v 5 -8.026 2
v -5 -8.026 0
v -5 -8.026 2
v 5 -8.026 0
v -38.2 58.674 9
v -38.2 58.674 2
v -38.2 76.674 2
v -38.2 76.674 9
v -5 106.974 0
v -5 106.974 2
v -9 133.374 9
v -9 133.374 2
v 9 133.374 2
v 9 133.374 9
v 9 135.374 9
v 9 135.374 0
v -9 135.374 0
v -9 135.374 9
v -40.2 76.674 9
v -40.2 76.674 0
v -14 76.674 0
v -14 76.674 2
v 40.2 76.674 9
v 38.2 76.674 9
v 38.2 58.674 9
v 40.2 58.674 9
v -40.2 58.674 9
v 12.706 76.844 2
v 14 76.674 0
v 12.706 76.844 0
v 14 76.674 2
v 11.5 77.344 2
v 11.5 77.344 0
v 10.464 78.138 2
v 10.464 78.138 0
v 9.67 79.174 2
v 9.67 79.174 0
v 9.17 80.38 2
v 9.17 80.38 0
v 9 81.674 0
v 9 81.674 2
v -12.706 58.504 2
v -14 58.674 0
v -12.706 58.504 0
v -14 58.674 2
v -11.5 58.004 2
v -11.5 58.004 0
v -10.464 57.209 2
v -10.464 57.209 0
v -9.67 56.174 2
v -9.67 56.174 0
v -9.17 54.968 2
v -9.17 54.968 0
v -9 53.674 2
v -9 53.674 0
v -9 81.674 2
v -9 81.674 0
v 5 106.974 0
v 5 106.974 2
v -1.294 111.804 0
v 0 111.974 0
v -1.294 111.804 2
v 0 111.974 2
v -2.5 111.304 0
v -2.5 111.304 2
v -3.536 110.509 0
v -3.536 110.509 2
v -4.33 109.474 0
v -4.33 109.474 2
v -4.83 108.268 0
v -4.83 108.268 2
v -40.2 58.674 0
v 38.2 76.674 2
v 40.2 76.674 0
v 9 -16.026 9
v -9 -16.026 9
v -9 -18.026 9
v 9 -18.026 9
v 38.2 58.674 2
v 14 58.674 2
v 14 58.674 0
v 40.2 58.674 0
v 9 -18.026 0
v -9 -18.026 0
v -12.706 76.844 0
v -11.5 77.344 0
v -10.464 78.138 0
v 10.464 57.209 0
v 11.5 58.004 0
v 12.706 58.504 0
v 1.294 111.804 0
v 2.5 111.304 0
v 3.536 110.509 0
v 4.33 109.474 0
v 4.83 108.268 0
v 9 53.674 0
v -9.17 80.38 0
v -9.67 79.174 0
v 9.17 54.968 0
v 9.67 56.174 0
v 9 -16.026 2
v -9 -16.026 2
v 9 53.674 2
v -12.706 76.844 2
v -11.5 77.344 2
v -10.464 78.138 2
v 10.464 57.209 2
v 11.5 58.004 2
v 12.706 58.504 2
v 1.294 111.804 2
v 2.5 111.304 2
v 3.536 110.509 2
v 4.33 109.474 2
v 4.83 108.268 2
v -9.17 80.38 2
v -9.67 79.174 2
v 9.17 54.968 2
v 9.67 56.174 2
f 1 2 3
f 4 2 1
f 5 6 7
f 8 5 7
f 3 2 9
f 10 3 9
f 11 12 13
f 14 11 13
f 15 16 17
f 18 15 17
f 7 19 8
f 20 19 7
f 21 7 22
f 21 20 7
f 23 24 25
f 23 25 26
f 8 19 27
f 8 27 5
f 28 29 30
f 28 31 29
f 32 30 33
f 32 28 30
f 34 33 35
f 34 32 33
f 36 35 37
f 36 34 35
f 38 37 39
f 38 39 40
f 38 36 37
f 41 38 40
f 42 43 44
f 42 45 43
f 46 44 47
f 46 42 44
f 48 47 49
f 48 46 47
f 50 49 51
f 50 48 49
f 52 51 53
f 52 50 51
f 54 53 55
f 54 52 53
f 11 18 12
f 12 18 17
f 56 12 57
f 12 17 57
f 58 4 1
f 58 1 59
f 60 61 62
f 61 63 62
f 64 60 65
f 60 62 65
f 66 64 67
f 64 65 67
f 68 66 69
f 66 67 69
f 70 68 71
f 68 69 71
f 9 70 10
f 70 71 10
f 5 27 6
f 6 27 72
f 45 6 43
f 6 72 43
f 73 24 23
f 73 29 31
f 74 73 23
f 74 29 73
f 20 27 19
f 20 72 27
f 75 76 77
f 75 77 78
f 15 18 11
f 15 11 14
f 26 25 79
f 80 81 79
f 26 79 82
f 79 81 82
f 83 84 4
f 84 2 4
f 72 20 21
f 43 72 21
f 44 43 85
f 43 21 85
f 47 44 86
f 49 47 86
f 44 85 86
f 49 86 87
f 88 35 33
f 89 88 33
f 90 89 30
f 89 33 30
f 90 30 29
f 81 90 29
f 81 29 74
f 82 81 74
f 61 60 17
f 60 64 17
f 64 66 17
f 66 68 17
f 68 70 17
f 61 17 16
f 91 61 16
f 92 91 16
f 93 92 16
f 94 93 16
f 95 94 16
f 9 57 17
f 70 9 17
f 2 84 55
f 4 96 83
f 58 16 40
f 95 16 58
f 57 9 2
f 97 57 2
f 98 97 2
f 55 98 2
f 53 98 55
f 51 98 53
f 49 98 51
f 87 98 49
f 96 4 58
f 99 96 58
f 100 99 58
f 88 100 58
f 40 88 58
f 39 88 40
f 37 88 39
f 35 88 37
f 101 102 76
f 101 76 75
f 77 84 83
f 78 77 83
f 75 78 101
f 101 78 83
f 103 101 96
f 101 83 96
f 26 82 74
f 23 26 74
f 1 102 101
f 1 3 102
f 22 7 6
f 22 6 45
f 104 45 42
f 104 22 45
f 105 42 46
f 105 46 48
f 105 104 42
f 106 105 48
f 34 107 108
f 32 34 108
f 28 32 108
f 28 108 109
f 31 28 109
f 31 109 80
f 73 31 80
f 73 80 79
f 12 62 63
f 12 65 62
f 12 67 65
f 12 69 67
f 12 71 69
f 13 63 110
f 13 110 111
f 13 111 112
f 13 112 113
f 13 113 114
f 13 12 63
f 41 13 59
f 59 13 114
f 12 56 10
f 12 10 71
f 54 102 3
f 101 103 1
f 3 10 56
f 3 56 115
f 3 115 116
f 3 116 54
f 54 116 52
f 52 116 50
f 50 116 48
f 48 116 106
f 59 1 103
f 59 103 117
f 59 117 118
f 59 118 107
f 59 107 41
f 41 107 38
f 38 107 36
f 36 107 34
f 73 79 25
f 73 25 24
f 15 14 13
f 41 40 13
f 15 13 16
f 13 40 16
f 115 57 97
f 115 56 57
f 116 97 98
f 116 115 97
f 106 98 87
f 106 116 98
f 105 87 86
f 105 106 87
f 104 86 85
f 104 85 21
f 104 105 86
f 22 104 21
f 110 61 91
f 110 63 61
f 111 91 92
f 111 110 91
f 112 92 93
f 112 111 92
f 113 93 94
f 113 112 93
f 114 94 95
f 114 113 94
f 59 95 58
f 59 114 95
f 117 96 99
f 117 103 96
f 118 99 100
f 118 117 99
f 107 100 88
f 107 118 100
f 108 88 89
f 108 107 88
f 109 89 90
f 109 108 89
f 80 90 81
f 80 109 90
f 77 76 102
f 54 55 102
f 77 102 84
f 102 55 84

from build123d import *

# Parameters (mm, degrees)
F0_W     = 10
F0_H     = 120
F0_W_2   = 31.2
F0_H_2   = 18
F1_DEPTH = 2
F3_W     = 2
F3_H     = 18
F3_W_2   = 18
F3_H_2   = 2
F4_DEPTH = 7
F5_R     = 4.99999


# Not quite as in the source:
# - a fillet or chamfer is up to 0.001 mm smaller than in the source, because OpenCascade refuses the exact size


with BuildPart() as f1:
    # F0 (on Top) → F1 (new body)
    with BuildSketch(Plane.XY):
        Polygon((9, 135.3739356415), (-9, 135.3739356415), (-9, 76.6739356415), (-9, 58.6739356415), (-9, -18.0260643585), (9, -18.0260643585), (9, 58.6739356415), (9, 76.6739356415), align=None)
        with Locations((0, 51.9739356415)):
            Rectangle(F0_W, F0_H, mode=Mode.SUBTRACT)
        with Locations((-24.6, 67.6739356415)):
            Rectangle(F0_W_2, F0_H_2)
        with Locations((24.6, 67.6739356415)):
            Rectangle(F0_W_2, F0_H_2)
    extrude(amount=F1_DEPTH)

    # F3 (on face) → F4 (join)
    with BuildSketch(Plane.XY.offset(2)):
        with Locations((-39.2, 67.6739356415)):
            Rectangle(F3_W, F3_H)
        with Locations((39.2, 67.6739356415)):
            Rectangle(F3_W, F3_H)
        with Locations((0, 134.3739356415)):
            Rectangle(F3_W_2, F3_H_2)
        with Locations((0, -17.0260643585)):
            Rectangle(F3_W_2, F3_H_2)
    extrude(amount=F4_DEPTH)

    # F5 (radius 5 in the source; OpenCascade refuses exactly that, so slightly less here)
    f5_edges = [f1.edges().sort_by_distance(p)[0] for p in [
        (-9, 58.673936, 1),
        (9, 58.673936, 1),
        (9, 76.673936, 1),
        (-9, 76.673936, 1),
        (-5, 111.973936, 1),
        (5, 111.973936, 1),
    ]]
    fillet(f5_edges, radius=F5_R)


solid = f1.part
